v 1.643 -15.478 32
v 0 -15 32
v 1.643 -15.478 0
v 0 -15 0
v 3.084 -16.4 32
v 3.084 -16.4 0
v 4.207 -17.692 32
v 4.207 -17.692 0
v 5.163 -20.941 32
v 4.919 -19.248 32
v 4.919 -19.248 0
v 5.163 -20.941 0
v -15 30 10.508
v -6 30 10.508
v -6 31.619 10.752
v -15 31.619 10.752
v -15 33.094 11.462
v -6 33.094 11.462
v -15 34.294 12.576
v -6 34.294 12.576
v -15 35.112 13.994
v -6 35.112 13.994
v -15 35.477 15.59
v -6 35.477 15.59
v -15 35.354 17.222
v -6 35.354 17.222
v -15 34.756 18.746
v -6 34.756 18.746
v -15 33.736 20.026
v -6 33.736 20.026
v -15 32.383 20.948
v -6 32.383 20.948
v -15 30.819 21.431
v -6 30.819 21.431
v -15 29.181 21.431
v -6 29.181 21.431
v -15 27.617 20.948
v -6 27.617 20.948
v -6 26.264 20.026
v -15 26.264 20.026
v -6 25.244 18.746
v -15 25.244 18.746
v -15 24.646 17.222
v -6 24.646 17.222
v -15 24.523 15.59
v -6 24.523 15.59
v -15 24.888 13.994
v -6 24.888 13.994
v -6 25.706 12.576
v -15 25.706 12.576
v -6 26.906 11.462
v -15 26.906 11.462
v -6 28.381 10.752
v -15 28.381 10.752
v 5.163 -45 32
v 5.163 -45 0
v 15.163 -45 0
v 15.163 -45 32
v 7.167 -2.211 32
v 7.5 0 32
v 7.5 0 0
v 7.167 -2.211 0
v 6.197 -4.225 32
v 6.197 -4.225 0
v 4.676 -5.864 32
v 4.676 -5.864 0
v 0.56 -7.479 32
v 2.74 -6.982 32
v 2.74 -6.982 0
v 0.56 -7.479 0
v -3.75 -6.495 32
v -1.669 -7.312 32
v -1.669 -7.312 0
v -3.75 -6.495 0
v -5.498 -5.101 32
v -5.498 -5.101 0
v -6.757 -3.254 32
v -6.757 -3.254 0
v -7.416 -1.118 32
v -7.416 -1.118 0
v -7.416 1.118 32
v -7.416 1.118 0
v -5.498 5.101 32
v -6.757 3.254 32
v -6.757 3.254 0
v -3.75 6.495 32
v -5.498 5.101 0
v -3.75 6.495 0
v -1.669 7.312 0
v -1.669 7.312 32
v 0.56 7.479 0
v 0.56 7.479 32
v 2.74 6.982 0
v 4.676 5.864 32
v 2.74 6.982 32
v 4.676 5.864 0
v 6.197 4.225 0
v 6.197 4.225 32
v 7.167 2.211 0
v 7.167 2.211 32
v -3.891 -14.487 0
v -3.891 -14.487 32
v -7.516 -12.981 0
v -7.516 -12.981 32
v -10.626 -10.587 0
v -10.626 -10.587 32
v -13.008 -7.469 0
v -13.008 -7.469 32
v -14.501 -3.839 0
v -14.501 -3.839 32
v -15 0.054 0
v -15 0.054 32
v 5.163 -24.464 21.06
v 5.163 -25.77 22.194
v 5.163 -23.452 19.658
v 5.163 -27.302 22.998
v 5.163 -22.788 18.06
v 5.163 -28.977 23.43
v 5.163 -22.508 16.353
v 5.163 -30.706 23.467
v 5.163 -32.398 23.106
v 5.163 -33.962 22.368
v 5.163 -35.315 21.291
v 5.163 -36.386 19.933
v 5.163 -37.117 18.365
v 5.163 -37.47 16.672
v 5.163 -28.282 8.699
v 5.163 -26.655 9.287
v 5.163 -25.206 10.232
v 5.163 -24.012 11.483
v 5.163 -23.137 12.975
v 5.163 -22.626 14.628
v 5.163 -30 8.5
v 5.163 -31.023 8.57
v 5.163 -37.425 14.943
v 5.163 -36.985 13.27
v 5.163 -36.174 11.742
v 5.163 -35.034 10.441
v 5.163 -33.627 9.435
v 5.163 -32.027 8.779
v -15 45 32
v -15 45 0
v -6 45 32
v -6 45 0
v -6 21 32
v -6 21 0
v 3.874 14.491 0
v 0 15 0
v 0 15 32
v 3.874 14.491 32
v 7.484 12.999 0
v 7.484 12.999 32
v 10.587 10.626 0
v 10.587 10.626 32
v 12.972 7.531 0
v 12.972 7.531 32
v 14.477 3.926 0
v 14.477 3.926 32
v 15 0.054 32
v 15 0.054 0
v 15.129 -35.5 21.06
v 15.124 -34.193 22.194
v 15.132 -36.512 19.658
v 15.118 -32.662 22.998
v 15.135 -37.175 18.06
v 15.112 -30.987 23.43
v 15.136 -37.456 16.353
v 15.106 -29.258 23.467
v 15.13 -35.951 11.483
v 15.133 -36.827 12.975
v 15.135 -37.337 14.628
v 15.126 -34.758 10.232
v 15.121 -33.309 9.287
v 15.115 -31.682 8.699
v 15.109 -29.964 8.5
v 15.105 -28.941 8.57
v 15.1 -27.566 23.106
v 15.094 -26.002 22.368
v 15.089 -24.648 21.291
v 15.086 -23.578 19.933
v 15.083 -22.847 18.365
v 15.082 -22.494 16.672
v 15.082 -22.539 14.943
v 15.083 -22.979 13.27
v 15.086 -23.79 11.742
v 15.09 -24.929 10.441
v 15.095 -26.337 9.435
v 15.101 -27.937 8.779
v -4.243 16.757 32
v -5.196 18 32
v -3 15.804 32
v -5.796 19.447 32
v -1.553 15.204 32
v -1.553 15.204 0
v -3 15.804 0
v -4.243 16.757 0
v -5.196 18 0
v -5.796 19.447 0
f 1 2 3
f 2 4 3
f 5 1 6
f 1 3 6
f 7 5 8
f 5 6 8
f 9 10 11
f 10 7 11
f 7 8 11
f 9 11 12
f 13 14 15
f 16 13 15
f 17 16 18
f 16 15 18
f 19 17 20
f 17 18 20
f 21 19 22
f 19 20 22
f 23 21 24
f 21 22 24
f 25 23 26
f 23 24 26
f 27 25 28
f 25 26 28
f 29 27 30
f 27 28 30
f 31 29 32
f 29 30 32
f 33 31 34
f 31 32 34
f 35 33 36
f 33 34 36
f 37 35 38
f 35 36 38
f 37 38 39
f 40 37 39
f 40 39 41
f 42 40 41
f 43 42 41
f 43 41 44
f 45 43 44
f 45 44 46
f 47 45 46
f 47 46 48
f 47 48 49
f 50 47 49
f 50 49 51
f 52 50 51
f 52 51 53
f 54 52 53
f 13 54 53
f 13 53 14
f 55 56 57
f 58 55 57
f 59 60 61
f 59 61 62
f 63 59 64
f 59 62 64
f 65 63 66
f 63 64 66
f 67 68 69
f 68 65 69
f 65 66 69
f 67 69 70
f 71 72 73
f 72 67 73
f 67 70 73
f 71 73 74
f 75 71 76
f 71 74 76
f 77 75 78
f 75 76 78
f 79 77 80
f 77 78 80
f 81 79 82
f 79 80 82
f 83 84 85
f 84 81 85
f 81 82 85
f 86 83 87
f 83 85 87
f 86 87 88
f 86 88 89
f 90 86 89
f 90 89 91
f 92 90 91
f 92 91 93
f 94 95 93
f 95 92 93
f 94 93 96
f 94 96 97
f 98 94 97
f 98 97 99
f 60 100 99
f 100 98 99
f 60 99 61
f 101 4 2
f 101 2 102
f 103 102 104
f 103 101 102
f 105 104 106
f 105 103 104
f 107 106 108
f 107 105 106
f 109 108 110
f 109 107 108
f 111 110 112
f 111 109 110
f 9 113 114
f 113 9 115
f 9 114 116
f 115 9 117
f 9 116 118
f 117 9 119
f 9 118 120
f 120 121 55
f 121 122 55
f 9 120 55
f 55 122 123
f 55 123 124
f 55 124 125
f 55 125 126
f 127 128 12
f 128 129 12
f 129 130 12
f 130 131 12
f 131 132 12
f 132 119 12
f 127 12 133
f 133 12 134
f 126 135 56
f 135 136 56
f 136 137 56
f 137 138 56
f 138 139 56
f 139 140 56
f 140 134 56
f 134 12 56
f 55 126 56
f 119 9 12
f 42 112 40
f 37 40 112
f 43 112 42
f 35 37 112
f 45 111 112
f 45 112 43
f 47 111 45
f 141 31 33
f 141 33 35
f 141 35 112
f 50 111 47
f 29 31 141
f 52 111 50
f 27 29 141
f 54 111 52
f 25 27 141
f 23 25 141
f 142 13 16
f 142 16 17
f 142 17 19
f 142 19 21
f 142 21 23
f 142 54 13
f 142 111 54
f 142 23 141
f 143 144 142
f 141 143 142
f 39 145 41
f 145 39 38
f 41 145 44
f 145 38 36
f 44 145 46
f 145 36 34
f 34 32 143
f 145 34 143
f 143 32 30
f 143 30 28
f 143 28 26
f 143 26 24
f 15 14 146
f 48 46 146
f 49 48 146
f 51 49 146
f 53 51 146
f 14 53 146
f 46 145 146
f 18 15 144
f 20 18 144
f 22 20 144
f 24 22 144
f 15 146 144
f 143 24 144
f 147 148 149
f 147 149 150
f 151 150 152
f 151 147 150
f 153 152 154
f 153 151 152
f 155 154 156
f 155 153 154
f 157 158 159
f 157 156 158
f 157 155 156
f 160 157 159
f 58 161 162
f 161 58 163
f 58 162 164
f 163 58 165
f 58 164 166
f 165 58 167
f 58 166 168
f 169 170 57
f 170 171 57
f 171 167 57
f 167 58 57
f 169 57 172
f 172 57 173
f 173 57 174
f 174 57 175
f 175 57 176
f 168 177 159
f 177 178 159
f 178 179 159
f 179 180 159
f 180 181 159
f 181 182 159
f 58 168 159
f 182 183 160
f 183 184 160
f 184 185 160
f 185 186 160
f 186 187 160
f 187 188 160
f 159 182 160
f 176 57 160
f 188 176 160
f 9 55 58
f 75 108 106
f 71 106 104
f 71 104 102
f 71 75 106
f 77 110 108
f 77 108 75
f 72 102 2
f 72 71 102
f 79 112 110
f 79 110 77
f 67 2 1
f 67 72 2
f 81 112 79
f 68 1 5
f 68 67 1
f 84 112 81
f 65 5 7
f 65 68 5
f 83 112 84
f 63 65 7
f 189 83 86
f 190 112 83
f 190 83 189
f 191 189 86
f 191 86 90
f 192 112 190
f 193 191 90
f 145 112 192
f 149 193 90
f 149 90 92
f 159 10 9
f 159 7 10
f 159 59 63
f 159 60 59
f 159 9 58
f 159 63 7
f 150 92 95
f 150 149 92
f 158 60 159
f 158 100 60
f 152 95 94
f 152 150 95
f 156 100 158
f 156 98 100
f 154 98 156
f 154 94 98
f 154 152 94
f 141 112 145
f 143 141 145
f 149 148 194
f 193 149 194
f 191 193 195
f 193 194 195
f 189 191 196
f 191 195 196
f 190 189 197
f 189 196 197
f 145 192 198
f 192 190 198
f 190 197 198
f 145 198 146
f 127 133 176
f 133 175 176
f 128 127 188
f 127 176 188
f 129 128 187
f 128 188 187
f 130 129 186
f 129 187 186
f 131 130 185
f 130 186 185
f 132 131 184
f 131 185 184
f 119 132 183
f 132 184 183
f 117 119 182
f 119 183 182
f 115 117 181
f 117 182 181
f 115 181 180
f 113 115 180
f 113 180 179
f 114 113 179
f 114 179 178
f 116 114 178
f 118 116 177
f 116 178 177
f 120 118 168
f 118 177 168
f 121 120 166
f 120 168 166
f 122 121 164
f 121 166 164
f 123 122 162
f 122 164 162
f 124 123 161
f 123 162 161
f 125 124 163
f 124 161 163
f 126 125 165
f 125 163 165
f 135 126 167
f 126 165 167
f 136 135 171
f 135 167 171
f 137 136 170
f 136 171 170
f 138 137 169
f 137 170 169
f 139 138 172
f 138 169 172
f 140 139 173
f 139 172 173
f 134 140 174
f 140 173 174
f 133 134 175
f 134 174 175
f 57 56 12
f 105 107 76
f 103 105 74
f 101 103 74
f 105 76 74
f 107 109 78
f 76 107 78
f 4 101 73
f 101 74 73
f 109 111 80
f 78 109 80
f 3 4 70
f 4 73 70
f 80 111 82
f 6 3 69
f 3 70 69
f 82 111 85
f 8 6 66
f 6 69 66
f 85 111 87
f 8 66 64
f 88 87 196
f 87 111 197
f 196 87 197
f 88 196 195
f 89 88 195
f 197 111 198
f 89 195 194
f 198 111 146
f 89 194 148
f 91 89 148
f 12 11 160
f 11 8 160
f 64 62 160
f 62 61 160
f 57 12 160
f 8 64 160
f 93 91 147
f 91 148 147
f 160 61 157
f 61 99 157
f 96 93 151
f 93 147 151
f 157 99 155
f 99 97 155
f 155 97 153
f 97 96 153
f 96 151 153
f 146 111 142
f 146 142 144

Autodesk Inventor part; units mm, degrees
ref_plane "YZ Plane" through (0, 0, 0) normal (1, 0, 0) x (0, 1, 0)
ref_plane "XZ Plane" through (0, 0, 0) normal (0, 1, 0) x (-1, 0, 0)
ref_plane "XY Plane" through (0, 0, 0) normal (0, 0, 1) x (1, 0, 0)
sketch "Náčrt1" plane through (0, 0, 0) normal (0, 0, 1) x (1, 0, 0)
  line L0 (5.1631, -20.9413) -> (5.1631, -45)
  arc A0 (5.1631, -20.9413) -> (0, -15) centre (-0.8369, -20.9413) ccw
  line L1 (5.1631, -45) -> (15.1631, -45)
  line L2 (15.1631, -45) -> (14.9999, 0.0543)
  line L3 (-14.9999, 0.0543) -> (-14.9999, 45)
  arc A1 (-6, 21) -> (0, 15) centre (0, 21) ccw
  line L4 (-6, 21) -> (-6, 45)
  line L5 (-6, 45) -> (-14.9999, 45)
  circle A2 centre (0, 0) radius 7.5
  arc A3 (-14.9999, 0.0543) -> (0, -15) centre (0, 0) ccw
  arc A4 (14.9999, 0.0543) -> (0, 15) centre (0, 0) ccw
  dimension "d1" = 6
  dimension "d2" = 45
  dimension "d3" = 10
  dimension "d10" = 12
  dimension "d11" = 15
extrude "Vysunutí1" add sketch "Náčrt1" along normal blind 32
sketch "Náčrt2" plane through (14.9999, 0.0543, 32) normal (1, 0.0036, 0) x (0, 0, -1)
  line L0 (32, -45.0184) -> (0, -45.0184) projected
  circle A0 centre (16, -30.0184) radius 7.5
  line L1 (32, -45.0546) -> (32, 0) projected
  dimension "d15" = 15
  dimension "d16" = 15
  dimension "d17" = 16
extrude "Vysunutí2" cut sketch "Náčrt2" against normal blind 32
sketch "Náčrt3" plane through (-6, 21, 0) normal (1, 0, 0) x (0, 0, -1)
  circle A0 centre (-16, 9) radius 5.4921
  line L0 (0, 0) -> (0, 24) projected
  line L1 (0, 24) -> (-32, 24) projected
  point P0 (0, -21)
  dimension "d20" = 16
  dimension "d21" = 15
extrude "Vysunutí3" cut sketch "Náčrt3" against normal blind 32
properties part number "15"
